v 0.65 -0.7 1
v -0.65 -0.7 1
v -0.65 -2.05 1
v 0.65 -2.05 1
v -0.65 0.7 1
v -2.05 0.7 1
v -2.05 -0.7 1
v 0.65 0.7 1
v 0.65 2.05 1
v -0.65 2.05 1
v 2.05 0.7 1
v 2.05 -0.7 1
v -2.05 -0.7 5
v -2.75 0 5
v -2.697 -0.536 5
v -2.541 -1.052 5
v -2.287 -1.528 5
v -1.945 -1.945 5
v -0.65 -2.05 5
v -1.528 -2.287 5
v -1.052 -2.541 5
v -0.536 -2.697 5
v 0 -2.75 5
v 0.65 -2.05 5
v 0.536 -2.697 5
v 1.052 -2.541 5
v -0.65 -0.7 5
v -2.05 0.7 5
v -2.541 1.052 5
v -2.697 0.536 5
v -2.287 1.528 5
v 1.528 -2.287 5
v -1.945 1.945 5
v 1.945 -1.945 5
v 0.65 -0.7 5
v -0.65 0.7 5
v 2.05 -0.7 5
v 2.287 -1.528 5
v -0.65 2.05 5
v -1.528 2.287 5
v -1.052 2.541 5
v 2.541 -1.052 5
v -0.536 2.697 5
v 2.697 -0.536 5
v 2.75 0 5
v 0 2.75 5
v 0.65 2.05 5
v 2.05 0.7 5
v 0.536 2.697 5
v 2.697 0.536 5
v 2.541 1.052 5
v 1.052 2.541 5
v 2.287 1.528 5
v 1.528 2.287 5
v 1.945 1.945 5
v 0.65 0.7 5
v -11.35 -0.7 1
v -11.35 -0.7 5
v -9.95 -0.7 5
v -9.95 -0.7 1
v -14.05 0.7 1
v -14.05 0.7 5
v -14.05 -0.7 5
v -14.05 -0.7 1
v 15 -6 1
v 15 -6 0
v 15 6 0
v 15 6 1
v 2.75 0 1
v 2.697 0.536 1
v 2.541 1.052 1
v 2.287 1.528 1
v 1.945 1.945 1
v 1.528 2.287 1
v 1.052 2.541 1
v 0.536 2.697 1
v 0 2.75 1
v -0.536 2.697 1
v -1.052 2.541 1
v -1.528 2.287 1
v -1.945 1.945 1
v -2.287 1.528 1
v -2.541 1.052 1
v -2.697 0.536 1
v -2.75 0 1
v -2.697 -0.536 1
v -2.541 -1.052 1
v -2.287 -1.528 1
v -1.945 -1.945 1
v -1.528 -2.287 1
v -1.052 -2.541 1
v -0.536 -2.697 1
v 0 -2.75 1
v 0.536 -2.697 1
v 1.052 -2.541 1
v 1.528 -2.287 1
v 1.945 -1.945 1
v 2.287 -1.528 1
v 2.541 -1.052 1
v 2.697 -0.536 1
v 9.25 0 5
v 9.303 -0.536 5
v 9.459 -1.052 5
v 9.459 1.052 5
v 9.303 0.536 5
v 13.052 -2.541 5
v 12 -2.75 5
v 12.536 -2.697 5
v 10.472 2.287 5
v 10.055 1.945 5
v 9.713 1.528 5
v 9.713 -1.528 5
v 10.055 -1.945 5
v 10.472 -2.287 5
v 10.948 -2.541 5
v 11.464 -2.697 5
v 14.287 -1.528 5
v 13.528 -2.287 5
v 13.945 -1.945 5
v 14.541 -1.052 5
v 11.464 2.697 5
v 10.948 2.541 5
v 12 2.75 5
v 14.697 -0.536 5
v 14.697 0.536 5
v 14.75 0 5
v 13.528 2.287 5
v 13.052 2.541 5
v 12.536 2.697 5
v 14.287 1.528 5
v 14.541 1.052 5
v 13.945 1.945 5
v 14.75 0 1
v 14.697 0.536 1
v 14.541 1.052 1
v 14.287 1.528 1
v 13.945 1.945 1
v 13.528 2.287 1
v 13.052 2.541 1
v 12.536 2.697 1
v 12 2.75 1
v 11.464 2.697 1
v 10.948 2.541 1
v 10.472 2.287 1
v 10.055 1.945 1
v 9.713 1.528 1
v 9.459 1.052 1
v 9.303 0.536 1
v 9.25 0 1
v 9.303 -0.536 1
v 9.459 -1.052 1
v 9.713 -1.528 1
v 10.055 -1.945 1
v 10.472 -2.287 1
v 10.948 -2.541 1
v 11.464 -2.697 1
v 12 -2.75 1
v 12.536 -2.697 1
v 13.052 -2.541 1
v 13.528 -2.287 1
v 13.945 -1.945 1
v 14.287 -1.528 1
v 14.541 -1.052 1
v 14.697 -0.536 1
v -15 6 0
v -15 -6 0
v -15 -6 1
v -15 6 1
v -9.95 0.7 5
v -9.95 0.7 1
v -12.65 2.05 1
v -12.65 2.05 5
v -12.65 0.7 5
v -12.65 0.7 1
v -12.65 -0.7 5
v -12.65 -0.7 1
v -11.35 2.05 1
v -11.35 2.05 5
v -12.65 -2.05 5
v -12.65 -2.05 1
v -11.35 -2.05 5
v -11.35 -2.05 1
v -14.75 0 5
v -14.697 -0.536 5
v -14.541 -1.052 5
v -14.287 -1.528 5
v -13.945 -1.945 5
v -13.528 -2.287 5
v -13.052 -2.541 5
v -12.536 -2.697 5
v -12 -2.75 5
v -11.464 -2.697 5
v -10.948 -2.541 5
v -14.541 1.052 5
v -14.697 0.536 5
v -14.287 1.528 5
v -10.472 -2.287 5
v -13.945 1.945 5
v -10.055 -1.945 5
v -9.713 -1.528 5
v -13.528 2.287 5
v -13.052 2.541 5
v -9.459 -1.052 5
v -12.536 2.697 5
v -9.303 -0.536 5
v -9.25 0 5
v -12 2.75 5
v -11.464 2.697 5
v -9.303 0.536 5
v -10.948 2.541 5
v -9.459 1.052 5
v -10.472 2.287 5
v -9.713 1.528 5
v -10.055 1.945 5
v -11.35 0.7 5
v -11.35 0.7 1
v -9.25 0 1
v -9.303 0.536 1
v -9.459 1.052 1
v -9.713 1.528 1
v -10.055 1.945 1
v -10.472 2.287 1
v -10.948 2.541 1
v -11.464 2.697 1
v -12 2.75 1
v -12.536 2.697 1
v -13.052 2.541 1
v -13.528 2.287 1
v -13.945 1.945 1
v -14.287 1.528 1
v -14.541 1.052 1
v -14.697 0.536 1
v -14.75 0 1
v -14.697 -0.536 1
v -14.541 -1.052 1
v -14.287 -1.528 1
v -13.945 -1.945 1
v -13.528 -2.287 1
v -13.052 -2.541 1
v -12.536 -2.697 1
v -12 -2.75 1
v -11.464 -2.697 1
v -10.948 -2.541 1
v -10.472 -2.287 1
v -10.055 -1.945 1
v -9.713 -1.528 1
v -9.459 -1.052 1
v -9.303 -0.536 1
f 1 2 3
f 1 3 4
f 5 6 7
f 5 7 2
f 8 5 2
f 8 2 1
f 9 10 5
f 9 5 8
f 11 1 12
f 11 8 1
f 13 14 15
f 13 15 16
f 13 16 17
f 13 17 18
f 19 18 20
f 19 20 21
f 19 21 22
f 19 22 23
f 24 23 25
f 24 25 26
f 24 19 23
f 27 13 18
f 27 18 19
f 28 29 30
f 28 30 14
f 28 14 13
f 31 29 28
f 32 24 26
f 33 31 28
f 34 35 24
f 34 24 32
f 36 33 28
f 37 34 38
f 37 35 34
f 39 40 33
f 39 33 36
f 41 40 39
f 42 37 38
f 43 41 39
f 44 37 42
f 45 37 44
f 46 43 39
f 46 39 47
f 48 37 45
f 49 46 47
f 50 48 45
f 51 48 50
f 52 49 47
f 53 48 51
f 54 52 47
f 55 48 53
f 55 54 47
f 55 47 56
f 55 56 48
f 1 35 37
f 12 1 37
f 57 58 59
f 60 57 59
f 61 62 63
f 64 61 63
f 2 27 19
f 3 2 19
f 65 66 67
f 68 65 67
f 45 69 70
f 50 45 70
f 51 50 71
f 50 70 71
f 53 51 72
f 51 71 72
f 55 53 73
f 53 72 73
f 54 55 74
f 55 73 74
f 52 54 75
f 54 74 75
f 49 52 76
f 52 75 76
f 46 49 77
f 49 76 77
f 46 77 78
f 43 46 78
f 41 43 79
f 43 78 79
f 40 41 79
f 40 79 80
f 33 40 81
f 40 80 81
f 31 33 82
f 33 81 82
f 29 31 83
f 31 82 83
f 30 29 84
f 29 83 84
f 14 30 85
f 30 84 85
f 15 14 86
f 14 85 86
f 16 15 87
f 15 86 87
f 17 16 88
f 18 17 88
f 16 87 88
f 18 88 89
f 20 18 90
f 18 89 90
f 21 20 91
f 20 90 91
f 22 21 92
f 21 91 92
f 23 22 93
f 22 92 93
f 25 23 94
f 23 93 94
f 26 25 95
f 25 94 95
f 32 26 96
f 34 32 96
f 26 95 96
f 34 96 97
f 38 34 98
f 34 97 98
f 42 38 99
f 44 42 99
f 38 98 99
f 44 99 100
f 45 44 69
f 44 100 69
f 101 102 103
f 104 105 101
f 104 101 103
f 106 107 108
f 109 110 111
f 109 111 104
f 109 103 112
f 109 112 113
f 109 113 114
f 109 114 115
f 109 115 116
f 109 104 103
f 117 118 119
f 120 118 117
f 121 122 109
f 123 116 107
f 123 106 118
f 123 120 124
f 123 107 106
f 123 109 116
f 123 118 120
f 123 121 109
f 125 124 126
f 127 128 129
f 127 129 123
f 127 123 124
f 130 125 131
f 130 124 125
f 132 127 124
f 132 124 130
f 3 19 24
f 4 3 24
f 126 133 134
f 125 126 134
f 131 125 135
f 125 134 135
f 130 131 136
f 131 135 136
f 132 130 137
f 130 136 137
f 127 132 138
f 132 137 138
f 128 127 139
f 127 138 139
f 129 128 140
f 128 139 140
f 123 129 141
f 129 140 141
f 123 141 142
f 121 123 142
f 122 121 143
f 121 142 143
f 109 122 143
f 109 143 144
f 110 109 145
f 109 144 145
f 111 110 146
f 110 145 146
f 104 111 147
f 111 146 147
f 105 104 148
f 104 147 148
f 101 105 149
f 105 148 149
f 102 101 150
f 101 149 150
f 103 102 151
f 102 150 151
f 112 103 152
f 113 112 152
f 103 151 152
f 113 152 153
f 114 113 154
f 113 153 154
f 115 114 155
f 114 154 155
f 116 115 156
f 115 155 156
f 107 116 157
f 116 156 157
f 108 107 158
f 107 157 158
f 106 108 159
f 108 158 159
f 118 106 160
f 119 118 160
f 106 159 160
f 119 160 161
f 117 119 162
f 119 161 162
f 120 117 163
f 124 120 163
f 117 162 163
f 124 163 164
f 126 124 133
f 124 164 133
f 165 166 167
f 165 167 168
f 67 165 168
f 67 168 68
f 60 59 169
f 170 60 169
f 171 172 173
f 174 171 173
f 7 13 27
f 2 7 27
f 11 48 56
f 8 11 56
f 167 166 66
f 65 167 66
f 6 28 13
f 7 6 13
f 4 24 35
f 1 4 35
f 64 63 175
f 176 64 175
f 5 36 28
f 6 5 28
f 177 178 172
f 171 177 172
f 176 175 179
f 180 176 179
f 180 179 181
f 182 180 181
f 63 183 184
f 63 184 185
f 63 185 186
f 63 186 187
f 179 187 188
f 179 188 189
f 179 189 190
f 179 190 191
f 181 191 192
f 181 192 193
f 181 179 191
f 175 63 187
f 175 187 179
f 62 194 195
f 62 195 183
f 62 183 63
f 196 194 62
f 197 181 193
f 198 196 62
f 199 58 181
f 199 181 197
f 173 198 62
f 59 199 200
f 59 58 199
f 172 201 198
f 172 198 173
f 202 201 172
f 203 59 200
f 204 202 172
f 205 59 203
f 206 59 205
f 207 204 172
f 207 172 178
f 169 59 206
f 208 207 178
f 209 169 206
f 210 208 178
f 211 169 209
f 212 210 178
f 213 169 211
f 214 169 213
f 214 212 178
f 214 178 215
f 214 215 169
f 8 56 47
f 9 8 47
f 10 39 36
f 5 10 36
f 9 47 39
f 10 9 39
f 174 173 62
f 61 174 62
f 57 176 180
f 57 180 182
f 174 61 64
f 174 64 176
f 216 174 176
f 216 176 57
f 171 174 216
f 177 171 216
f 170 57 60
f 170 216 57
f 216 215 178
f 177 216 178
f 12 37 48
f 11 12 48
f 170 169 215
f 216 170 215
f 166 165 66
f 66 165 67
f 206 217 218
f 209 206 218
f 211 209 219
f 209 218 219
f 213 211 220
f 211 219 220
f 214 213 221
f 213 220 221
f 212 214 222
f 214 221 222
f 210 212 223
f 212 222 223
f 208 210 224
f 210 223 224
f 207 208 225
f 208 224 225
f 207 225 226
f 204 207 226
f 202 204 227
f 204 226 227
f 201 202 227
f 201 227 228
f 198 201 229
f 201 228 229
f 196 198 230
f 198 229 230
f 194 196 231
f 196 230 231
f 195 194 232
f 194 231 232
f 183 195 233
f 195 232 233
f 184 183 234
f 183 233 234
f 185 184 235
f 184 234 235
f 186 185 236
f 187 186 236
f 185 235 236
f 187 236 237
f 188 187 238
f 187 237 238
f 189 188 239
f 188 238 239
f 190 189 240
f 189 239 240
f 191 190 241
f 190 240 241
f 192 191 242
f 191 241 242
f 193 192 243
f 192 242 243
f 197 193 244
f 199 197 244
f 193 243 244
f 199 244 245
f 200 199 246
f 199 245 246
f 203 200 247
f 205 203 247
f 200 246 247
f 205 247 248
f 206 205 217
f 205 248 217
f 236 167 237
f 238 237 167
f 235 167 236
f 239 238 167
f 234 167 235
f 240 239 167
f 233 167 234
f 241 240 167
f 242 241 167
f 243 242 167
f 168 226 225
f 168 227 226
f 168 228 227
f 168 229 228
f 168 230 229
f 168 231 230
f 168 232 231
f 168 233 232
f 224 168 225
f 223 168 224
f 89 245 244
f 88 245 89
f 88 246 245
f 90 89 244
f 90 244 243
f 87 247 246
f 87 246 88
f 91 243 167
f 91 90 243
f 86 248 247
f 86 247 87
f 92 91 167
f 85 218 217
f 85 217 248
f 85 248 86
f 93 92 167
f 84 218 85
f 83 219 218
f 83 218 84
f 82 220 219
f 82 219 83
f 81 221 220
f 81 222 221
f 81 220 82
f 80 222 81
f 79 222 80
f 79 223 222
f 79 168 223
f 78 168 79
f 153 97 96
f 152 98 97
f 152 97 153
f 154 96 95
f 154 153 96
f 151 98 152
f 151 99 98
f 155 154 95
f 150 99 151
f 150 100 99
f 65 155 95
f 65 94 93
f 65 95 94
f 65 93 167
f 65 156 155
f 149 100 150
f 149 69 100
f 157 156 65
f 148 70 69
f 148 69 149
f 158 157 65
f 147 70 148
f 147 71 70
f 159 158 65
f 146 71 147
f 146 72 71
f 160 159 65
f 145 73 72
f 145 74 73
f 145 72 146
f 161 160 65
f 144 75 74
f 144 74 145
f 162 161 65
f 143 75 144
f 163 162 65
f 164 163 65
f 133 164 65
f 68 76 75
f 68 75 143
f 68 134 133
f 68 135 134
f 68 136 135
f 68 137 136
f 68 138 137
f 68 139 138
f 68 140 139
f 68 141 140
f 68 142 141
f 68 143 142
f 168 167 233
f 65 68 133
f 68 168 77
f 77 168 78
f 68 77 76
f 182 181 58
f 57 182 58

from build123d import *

# Parameters (mm, degrees)
SKETCH_W     = 30
SKETCH_H     = 12
PAD_DEPTH    = 1
SKETCH001_R  = 2.75
PAD001_DEPTH = 4
POCKET_DEPTH = 4


with BuildPart() as part:
    # Sketch → Pad (new body)
    with BuildSketch(Plane.XY):
        Rectangle(SKETCH_W, SKETCH_H)
    extrude(amount=PAD_DEPTH)

    # Sketch001 (on Face6 of Pad) → Pad001 (join)
    with BuildSketch(Plane.XY.offset(1)):
        Circle(SKETCH001_R)
        with Locations((-12, 0)):
            Circle(SKETCH001_R)
        with Locations((12, 0)):
            Circle(SKETCH001_R)
    extrude(amount=PAD001_DEPTH)

    # Sketch002 (on Face11 of Pad001) → Pocket (cut)
    with BuildSketch(Plane.XY.offset(5)):
        Polygon((-0.65, 2.05), (-0.65, 0.7), (-2.05, 0.7), (-2.05, -0.7), (-0.65, -0.7), (-0.65, -2.05), (0.65, -2.05), (0.65, -0.7), (2.05, -0.7), (2.05, 0.7), (0.65, 0.7), (0.65, 2.05), align=None)
        Polygon((-12.65, 2.05), (-12.65, 0.7), (-14.05, 0.7), (-14.05, -0.7), (-12.65, -0.7), (-12.65, -2.05), (-11.35, -2.05), (-11.35, -0.7), (-9.95, -0.7), (-9.95, 0.7), (-11.35, 0.7), (-11.35, 2.05), align=None)
    extrude(amount=-POCKET_DEPTH, mode=Mode.SUBTRACT)


solid = part.part
